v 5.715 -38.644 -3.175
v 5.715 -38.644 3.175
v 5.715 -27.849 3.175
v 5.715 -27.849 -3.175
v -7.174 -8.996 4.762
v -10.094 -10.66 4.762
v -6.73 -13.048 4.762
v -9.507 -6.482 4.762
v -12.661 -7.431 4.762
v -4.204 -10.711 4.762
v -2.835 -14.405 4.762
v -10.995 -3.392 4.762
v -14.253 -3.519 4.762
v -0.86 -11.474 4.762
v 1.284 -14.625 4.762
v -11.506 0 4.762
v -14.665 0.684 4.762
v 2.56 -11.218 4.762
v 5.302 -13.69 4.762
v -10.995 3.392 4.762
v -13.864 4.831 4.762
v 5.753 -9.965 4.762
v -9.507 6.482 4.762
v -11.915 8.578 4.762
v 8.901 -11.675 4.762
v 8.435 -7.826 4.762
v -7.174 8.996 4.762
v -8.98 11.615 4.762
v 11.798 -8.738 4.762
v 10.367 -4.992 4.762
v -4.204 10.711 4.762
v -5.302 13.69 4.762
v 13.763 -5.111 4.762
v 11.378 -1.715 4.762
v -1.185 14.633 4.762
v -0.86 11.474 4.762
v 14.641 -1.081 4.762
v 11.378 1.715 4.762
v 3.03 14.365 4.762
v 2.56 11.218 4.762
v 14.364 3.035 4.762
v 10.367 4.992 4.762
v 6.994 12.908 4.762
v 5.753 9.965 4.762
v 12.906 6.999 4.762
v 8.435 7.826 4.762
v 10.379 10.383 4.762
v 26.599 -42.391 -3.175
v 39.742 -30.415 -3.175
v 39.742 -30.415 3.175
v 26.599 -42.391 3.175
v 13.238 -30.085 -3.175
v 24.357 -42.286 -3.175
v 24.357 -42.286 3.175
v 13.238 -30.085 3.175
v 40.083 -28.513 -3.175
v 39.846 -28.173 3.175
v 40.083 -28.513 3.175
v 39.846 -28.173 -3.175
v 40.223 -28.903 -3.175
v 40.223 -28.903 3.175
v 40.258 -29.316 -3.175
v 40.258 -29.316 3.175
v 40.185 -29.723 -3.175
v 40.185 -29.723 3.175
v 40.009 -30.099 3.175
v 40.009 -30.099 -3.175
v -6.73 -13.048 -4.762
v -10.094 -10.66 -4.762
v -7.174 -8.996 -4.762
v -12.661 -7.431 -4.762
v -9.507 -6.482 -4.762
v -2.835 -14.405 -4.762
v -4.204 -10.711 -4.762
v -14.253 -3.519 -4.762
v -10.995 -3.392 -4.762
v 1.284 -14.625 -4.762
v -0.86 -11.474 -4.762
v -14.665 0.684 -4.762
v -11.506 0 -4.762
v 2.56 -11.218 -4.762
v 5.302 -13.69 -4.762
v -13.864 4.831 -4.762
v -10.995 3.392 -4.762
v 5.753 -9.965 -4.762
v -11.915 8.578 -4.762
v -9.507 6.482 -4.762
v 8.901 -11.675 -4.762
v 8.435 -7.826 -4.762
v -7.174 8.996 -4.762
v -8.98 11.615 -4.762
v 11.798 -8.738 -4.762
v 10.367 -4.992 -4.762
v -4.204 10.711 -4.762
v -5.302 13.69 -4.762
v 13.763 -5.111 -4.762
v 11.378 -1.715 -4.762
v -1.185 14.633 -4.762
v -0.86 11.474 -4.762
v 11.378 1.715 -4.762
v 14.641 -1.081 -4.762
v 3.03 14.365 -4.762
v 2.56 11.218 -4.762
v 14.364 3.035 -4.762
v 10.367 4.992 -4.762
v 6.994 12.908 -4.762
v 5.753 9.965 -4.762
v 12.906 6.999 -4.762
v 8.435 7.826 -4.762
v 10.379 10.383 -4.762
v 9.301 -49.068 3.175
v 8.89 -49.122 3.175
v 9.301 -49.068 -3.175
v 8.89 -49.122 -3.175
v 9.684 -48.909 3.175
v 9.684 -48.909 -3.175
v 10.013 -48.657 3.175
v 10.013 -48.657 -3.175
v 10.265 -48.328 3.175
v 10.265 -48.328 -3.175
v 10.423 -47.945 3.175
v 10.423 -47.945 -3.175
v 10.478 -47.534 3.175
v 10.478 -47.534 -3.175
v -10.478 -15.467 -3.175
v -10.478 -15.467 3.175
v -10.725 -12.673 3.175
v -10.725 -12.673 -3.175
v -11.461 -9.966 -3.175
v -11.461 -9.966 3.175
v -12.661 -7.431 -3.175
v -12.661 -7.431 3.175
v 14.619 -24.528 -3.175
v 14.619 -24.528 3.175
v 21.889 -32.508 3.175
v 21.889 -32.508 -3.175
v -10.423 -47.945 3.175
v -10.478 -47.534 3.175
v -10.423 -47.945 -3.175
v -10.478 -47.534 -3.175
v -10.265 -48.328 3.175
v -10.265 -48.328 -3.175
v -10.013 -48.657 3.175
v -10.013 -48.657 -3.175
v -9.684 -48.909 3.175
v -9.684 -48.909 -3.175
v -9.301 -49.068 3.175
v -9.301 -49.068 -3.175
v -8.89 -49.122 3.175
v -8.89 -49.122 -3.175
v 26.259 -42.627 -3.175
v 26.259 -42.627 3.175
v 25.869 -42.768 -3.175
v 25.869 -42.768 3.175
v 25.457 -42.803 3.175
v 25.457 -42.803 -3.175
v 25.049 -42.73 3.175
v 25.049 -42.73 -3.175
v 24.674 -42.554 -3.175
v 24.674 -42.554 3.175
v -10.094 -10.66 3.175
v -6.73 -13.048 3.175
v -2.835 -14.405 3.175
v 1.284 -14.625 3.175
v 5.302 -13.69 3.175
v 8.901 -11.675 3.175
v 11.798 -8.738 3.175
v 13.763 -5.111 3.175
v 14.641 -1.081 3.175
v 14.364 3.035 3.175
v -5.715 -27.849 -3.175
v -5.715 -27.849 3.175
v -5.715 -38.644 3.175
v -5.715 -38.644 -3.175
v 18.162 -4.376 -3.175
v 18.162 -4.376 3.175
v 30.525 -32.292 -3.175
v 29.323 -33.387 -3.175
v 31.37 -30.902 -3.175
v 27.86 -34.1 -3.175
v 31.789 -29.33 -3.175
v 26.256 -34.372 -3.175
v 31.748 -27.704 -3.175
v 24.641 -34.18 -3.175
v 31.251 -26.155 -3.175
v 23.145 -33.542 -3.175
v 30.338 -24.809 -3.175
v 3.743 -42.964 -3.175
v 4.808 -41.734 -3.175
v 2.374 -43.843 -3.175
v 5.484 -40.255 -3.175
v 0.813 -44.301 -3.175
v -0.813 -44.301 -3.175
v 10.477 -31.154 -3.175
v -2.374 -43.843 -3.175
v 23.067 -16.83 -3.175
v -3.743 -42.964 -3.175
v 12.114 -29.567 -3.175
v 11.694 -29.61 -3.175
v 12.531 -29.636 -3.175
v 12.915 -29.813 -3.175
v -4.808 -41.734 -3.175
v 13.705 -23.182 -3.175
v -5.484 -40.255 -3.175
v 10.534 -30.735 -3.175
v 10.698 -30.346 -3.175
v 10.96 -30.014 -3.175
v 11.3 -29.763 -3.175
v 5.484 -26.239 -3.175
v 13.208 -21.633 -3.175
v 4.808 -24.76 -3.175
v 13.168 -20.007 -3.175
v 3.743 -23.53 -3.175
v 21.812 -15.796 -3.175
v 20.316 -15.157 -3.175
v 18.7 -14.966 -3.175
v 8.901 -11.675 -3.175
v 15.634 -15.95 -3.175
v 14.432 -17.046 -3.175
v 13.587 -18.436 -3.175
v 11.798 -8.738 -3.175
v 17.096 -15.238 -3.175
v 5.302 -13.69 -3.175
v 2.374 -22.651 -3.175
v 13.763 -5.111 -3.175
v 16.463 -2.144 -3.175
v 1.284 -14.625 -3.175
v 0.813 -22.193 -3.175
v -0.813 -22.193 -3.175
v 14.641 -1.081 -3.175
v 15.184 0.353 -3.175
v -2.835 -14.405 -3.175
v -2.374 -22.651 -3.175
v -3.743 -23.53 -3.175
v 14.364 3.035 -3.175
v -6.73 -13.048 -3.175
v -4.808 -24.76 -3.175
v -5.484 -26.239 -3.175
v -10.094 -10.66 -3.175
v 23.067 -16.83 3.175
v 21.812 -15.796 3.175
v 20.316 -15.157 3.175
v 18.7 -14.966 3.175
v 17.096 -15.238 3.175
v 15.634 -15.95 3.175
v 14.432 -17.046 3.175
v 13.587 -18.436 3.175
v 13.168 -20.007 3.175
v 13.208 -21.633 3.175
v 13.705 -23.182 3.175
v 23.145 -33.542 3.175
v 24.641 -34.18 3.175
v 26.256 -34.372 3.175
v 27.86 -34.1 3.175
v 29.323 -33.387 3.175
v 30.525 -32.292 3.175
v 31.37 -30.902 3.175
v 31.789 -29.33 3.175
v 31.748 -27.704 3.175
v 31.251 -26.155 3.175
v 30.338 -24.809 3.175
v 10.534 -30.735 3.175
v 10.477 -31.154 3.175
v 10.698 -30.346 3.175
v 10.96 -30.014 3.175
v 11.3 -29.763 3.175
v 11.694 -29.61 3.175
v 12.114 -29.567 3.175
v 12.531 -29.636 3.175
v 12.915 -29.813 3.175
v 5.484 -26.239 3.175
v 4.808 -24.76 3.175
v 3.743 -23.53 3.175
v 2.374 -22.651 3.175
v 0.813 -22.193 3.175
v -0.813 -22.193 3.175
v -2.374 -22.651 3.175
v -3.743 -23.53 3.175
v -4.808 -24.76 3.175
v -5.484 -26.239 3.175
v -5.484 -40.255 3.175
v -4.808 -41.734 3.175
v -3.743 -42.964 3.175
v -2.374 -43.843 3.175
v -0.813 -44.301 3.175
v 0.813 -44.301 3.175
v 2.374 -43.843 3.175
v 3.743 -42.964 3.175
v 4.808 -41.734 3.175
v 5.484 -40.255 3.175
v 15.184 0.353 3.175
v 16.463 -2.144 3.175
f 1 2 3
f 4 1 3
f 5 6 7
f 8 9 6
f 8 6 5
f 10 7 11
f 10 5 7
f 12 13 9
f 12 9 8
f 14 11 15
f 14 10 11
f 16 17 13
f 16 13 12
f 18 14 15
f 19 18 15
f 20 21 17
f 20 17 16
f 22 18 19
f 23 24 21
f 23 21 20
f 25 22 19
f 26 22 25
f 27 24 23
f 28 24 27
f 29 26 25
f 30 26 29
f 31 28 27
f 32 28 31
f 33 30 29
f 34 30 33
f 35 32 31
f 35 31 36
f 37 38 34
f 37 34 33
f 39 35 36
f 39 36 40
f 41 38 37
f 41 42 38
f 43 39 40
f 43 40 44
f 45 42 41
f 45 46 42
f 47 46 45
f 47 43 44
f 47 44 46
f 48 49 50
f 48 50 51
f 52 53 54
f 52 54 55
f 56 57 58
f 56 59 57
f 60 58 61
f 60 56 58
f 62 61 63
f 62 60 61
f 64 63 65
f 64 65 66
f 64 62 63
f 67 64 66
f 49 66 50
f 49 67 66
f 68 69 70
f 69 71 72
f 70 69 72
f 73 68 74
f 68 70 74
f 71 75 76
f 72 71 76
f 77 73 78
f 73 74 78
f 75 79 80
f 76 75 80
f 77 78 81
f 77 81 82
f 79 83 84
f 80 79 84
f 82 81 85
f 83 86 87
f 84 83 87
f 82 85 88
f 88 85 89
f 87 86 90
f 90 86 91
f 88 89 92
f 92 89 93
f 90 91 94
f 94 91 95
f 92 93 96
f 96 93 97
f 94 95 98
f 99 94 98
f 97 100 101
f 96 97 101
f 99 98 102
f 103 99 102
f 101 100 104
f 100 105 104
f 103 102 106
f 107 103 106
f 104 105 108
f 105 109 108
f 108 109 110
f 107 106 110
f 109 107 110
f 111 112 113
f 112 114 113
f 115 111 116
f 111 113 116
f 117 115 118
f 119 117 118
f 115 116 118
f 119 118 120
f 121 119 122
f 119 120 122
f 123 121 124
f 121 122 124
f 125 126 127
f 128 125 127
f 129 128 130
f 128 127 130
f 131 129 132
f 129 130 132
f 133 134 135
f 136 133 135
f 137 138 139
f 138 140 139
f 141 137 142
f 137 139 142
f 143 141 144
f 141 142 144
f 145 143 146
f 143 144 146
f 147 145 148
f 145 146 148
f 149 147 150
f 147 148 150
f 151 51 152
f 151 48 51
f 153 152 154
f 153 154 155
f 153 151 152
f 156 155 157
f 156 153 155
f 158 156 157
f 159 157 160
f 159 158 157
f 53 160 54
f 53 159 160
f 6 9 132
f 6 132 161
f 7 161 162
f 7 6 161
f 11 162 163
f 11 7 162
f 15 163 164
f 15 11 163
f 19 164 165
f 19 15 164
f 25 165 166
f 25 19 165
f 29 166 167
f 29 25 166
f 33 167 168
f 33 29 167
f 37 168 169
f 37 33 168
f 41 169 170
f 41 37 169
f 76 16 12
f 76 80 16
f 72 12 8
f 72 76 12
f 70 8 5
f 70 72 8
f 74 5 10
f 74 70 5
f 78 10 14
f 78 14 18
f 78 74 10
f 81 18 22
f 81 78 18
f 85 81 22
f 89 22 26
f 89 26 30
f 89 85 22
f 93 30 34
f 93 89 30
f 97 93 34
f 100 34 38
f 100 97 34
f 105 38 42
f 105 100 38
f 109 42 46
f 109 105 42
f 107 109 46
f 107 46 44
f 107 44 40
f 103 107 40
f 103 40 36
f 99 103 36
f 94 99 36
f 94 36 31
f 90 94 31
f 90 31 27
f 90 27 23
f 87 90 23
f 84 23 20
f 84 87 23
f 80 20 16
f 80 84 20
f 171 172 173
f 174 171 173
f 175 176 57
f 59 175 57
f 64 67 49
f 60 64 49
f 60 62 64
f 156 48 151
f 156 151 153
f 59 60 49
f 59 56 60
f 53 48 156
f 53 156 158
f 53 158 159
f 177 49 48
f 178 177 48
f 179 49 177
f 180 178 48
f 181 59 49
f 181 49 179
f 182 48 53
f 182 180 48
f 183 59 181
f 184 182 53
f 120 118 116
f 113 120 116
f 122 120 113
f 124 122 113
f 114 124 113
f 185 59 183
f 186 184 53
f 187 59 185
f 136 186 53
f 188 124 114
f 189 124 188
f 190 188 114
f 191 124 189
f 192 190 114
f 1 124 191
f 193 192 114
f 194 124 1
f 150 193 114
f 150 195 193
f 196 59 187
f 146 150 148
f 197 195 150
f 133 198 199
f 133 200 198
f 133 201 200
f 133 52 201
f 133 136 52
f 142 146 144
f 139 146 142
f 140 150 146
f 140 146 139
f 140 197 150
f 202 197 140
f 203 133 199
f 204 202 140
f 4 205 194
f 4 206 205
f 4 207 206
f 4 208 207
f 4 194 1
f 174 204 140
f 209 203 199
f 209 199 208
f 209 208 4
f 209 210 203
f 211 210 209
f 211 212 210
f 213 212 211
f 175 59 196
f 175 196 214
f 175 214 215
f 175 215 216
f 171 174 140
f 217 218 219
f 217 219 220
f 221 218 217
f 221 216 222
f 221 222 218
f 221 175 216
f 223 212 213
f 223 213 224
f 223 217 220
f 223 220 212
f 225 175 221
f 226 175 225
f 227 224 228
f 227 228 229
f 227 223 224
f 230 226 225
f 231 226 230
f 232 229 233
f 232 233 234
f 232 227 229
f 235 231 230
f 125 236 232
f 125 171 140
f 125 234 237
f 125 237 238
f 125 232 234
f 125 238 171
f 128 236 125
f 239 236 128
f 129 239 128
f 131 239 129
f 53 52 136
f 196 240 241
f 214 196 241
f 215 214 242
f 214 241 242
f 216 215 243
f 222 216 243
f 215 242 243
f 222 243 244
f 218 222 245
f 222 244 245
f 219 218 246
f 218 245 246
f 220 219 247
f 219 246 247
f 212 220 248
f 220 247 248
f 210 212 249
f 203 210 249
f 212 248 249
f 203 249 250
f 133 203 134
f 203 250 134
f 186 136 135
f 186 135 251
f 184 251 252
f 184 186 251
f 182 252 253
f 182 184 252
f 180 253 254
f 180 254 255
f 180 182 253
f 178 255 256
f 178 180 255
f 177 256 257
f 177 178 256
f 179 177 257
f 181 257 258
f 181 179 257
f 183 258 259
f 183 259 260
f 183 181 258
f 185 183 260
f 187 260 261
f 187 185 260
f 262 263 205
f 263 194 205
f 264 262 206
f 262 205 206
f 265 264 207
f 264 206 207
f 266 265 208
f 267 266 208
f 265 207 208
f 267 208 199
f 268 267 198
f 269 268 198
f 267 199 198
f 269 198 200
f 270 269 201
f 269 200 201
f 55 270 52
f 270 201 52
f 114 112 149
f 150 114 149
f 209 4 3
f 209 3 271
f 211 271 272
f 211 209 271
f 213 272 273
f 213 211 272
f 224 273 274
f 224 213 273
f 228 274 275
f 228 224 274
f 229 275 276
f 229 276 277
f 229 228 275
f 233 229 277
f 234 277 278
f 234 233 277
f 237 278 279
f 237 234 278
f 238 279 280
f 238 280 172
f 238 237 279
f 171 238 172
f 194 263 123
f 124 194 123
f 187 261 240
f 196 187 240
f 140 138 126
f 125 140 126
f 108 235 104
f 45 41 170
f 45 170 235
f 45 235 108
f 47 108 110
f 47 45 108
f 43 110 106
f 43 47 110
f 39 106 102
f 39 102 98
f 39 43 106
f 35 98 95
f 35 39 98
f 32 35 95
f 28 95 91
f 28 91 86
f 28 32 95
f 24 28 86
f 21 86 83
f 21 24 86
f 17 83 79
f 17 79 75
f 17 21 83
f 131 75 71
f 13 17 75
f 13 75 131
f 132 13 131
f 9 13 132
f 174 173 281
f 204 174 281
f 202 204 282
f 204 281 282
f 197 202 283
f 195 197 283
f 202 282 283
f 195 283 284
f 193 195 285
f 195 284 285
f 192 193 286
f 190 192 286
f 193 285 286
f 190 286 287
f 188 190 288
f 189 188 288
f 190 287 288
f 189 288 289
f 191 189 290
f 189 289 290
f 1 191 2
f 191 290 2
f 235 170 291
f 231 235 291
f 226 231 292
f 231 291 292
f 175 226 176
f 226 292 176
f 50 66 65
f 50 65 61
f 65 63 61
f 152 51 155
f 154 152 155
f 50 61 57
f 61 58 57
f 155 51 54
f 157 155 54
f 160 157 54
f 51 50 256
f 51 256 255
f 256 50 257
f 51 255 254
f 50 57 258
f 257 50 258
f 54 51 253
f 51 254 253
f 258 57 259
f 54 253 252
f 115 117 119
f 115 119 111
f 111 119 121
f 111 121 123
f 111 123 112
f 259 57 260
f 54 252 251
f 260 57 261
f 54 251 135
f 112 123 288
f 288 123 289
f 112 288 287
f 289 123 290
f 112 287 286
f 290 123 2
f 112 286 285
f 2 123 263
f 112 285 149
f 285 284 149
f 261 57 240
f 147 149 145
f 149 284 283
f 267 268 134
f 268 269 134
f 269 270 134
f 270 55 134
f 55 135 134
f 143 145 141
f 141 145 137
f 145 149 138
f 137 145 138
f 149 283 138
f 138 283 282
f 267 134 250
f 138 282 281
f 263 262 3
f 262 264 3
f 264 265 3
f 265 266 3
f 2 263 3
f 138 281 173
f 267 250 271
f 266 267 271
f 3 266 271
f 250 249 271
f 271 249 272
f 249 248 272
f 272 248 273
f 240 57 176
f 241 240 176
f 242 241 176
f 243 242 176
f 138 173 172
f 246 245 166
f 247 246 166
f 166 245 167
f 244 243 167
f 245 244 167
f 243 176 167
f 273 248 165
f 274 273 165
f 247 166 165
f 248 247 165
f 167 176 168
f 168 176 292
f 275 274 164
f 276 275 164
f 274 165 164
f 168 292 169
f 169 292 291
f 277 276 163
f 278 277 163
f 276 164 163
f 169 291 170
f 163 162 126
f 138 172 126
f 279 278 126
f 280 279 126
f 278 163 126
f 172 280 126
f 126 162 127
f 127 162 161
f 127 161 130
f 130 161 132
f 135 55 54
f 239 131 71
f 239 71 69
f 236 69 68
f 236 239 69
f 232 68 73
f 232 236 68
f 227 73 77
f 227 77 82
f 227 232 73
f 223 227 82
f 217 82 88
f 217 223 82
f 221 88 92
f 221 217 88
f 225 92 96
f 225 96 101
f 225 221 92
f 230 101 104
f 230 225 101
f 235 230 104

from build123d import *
from build123d.topology import SkipClean

# Parameters (mm, degrees)
SKETCH1_R           = 11.5062
BOSS_EXTRUDE1_DEPTH = 4.7625
CUT_EXTRUDE1_START  = 4.7625
CUT_EXTRUDE1_DEPTH  = 1.5875
CUT_EXTRUDE2_START  = -3.175
CUT_EXTRUDE2_DEPTH  = 1.5875
FILLET1_R           = 1.5875


with BuildPart() as part:
    # Sketch1 → Boss-Extrude1 (new, symmetric)
    # profile 1 of 2: a face of its own
    with BuildSketch(Plane.XY):
        with BuildLine():
            ThreePointArc((-12.661467165, -7.431344606), (5.301915083, -13.690410143), (14.364087476, 3.034901057))
            ThreePointArc((14.364087476, 3.034901057), (15.768494782, -0.923849067), (18.162007104, -4.375683536))
            Line((18.162007104, -4.375683536), (40.915153964, -29.346022579))
            Line((40.915153964, -29.346022579), (25.42603388, -43.459816684))
            Line((25.42603388, -43.459816684), (10.4775, -27.054615176))
            Line((10.4775, -27.054615176), (10.4775, -49.121968099))
            Line((10.4775, -49.121968099), (-10.4775, -49.121968099))
            Line((-10.4775, -49.121968099), (-10.4775, -15.466968099))
            ThreePointArc((-10.4775, -15.466968099), (-11.033218502, -11.303407199), (-12.661467165, -7.431344606))
        make_face()
        with BuildLine():
            ThreePointArc((23.067259929, -16.829899337), (14.993737878, -16.454810433), (14.618648975, -24.528332485))
            Line((14.618648975, -24.528332485), (21.889391392, -32.507576164))
            ThreePointArc((21.889391392, -32.507576164), (29.962913444, -32.882665067), (30.338002347, -24.809143016))
            Line((30.338002347, -24.809143016), (23.067259929, -16.829899337))
        make_face(mode=Mode.SUBTRACT)
        with BuildLine():
            ThreePointArc((5.715, -27.849468099), (0, -22.134468099), (-5.715, -27.849468099))
            Line((-5.715, -27.849468099), (-5.715, -38.644468099))
            ThreePointArc((-5.715, -38.644468099), (0, -44.359468099), (5.715, -38.644468099))
            Line((5.715, -38.644468099), (5.715, -27.849468099))
        make_face(mode=Mode.SUBTRACT)
    # profile 2 of 2: a face of its own
    with BuildSketch(Plane.XY):
        with BuildLine():
            ThreePointArc((14.364087476, 3.034901057), (-5.301915083, 13.690410143), (-12.661467165, -7.431344606))
            ThreePointArc((-12.661467165, -7.431344606), (5.301915083, -13.690410143), (14.364087476, 3.034901057))
        make_face()
        with Locations(Location((0, 0, 0), (0, 0, 180))):
            Circle(SKETCH1_R, mode=Mode.SUBTRACT)
    extrude(amount=BOSS_EXTRUDE1_DEPTH, both=True)

    # Sketch3 → Cut-Extrude1 (cut)
    with SkipClean():  # the faces are left unmerged after this step: merging them gives an invalid solid
        with BuildSketch(Plane.XY.offset(CUT_EXTRUDE1_START)):
            with BuildLine():
                ThreePointArc((-12.661467165, -7.431344606), (5.301915083, -13.690410143), (14.364087476, 3.034901057))
                ThreePointArc((14.364087476, 3.034901057), (15.768494782, -0.923849067), (18.162007104, -4.375683536))
                Line((18.162007104, -4.375683536), (40.915153964, -29.346022579))
                Line((40.915153964, -29.346022579), (25.42603388, -43.459816684))
                Line((25.42603388, -43.459816684), (10.4775, -27.054615176))
                Line((10.4775, -27.054615176), (10.4775, -49.121968099))
                Line((10.4775, -49.121968099), (-10.4775, -49.121968099))
                Line((-10.4775, -49.121968099), (-10.4775, -15.466968099))
                ThreePointArc((-10.4775, -15.466968099), (-11.033218502, -11.303407199), (-12.661467165, -7.431344606))
            make_face()
            with BuildLine():
                ThreePointArc((23.067259929, -16.829899337), (14.993737878, -16.454810433), (14.618648975, -24.528332485))
                Line((14.618648975, -24.528332485), (21.889391392, -32.507576164))
                ThreePointArc((21.889391392, -32.507576164), (29.962913444, -32.882665067), (30.338002347, -24.809143016))
                Line((30.338002347, -24.809143016), (23.067259929, -16.829899337))
            make_face(mode=Mode.SUBTRACT)
            with BuildLine():
                ThreePointArc((5.715, -27.849468099), (0, -22.134468099), (-5.715, -27.849468099))
                Line((-5.715, -27.849468099), (-5.715, -38.644468099))
                ThreePointArc((-5.715, -38.644468099), (0, -44.359468099), (5.715, -38.644468099))
                Line((5.715, -38.644468099), (5.715, -27.849468099))
            make_face(mode=Mode.SUBTRACT)
        extrude(amount=-CUT_EXTRUDE1_DEPTH, mode=Mode.SUBTRACT)

    # Sketch3<11> → Cut-Extrude2 (cut)
    with SkipClean():  # the faces are left unmerged after this step: merging them gives an invalid solid
        with BuildSketch(Plane.XY.offset(CUT_EXTRUDE2_START)):
            with BuildLine():
                ThreePointArc((-12.661467165, -7.431344606), (5.301915083, -13.690410143), (14.364087476, 3.034901057))
                ThreePointArc((14.364087476, 3.034901057), (15.768494782, -0.923849067), (18.162007104, -4.375683536))
                Line((18.162007104, -4.375683536), (40.915153964, -29.346022579))
                Line((40.915153964, -29.346022579), (25.42603388, -43.459816684))
                Line((25.42603388, -43.459816684), (10.4775, -27.054615176))
                Line((10.4775, -27.054615176), (10.4775, -49.121968099))
                Line((10.4775, -49.121968099), (-10.4775, -49.121968099))
                Line((-10.4775, -49.121968099), (-10.4775, -15.466968099))
                ThreePointArc((-10.4775, -15.466968099), (-11.033218502, -11.303407199), (-12.661467165, -7.431344606))
            make_face()
            with BuildLine():
                ThreePointArc((23.067259929, -16.829899337), (14.993737878, -16.454810433), (14.618648975, -24.528332485))
                Line((14.618648975, -24.528332485), (21.889391392, -32.507576164))
                ThreePointArc((21.889391392, -32.507576164), (29.962913444, -32.882665067), (30.338002347, -24.809143016))
                Line((30.338002347, -24.809143016), (23.067259929, -16.829899337))
            make_face(mode=Mode.SUBTRACT)
            with BuildLine():
                ThreePointArc((5.715, -27.849468099), (0, -22.134468099), (-5.715, -27.849468099))
                Line((-5.715, -27.849468099), (-5.715, -38.644468099))
                ThreePointArc((-5.715, -38.644468099), (0, -44.359468099), (5.715, -38.644468099))
                Line((5.715, -38.644468099), (5.715, -27.849468099))
            make_face(mode=Mode.SUBTRACT)
        extrude(amount=-CUT_EXTRUDE2_DEPTH, mode=Mode.SUBTRACT)

    # Fillet1
    fillet1_edges = [part.edges().sort_by_distance(p)[0] for p in [
        (40.915153964, -29.346022579, 0),
        (25.42603388, -43.459816684, 0),
        (10.4775, -27.054615176, 0),
        (10.4775, -49.121968099, 0),
        (-10.4775, -49.121968099, 0),
    ]]
    fillet(fillet1_edges, radius=FILLET1_R)


solid = part.part
